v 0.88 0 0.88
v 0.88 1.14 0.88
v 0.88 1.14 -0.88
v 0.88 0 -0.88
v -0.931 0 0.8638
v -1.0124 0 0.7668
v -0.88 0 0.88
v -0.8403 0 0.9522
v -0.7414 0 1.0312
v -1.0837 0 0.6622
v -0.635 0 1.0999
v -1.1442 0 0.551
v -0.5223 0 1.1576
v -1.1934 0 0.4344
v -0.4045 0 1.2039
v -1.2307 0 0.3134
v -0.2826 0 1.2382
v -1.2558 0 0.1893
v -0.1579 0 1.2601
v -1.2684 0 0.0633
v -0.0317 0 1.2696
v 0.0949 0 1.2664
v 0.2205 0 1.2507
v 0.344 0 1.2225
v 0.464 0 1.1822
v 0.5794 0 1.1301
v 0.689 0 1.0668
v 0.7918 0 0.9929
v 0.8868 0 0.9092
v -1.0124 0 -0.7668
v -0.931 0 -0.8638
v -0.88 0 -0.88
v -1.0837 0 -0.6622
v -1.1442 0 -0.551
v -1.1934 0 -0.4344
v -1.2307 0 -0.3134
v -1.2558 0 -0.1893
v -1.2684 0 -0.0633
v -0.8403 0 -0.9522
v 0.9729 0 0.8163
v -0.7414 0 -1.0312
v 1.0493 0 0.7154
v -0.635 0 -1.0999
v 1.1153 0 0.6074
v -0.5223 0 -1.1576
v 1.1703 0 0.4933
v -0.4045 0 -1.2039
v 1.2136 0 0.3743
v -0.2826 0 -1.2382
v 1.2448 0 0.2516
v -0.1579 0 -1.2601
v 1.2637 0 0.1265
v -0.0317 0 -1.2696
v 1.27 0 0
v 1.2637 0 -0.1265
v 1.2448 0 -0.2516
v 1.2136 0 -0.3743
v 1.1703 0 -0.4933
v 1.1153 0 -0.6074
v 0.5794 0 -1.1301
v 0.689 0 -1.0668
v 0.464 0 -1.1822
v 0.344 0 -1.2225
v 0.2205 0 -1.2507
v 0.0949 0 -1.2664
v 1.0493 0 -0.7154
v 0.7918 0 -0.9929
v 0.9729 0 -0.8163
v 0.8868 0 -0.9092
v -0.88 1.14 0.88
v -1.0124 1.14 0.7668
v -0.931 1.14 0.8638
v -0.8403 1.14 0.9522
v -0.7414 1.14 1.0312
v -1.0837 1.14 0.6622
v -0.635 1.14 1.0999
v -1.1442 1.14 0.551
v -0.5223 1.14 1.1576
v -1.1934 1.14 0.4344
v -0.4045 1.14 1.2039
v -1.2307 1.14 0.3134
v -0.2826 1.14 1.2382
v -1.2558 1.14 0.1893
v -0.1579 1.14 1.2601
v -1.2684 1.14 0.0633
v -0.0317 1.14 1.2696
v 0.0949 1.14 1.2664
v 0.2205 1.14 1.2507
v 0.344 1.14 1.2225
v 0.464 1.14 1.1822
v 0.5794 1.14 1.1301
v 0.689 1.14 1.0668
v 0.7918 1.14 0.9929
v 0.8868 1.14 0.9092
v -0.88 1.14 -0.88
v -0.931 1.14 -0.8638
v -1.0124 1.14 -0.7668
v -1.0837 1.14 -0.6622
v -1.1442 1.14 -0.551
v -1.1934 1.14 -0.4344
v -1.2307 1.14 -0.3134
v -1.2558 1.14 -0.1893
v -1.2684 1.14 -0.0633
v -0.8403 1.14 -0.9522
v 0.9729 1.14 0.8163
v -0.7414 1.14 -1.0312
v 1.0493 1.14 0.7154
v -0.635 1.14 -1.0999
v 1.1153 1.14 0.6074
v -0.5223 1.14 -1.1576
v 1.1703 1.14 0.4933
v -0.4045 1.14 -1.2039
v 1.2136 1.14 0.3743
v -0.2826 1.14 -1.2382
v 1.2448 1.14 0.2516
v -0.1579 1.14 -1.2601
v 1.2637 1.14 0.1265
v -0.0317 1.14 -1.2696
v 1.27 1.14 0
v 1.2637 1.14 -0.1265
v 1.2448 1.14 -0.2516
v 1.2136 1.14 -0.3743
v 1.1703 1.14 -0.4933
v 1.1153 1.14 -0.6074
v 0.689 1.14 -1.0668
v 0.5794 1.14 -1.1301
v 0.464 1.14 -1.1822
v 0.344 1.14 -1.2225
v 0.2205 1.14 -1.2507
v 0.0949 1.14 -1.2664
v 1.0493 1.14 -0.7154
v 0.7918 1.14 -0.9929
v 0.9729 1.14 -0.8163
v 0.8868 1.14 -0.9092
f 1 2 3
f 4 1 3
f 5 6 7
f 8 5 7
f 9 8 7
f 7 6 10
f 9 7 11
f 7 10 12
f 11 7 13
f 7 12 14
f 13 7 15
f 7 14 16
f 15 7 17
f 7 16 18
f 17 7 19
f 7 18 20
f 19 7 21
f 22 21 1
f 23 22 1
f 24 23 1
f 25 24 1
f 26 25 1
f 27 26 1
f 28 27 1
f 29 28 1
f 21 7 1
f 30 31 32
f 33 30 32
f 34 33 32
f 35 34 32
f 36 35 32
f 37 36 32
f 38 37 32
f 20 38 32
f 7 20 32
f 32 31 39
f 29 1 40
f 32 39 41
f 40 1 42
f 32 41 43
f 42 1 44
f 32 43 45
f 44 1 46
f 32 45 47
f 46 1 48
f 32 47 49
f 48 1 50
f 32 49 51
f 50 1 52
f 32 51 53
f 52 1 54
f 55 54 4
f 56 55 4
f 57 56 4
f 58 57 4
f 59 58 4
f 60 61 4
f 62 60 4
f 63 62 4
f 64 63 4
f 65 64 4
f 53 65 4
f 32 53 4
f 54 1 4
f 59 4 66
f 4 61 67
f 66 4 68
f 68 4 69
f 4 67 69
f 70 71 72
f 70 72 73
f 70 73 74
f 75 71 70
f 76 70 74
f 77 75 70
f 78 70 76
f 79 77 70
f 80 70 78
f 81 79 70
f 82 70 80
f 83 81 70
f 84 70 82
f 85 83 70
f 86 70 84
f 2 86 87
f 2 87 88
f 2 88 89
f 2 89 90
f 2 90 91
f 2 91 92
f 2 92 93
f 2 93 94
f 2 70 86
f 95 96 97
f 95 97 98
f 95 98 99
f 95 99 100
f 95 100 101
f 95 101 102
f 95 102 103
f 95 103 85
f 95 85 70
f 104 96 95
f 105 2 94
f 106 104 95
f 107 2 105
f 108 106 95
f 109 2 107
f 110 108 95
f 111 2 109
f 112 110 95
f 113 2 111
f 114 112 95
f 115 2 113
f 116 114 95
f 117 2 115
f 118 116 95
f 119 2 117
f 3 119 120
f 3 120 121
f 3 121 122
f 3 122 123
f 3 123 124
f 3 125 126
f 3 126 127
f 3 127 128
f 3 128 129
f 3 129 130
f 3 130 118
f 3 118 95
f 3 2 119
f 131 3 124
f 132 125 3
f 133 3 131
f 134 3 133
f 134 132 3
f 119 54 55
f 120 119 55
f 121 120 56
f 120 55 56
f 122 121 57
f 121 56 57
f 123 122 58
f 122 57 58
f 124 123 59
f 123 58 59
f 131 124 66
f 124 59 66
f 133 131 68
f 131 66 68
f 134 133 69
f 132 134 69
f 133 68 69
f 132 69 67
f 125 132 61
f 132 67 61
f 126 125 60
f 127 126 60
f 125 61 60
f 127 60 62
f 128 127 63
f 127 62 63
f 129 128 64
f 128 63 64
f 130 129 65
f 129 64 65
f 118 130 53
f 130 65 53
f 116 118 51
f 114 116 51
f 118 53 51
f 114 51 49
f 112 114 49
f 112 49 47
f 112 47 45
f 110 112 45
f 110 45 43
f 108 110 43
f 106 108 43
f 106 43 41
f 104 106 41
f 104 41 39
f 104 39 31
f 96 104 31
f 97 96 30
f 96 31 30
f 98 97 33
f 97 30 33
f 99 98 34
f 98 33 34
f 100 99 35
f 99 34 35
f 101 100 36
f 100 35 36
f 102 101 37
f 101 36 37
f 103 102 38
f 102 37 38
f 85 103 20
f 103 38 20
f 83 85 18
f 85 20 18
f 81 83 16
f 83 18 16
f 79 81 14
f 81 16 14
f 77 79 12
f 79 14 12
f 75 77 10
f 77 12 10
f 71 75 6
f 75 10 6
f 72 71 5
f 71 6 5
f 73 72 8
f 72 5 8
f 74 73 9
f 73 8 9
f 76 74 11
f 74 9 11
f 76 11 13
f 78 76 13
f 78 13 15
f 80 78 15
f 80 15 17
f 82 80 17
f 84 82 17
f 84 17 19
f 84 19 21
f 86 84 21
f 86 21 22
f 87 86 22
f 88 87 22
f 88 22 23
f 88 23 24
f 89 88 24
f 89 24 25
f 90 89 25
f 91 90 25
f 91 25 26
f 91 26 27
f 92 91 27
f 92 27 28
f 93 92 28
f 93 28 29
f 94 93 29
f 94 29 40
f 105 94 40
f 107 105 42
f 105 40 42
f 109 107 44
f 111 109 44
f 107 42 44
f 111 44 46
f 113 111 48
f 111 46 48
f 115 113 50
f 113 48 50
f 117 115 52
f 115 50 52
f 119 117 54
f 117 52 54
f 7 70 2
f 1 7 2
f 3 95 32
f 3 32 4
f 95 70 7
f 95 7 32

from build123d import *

# Parameters (mm, degrees)
SKETCH1_R           = 1.27
BOSS_EXTRUDE1_DEPTH = 1.14
SKETCH2_W           = 1.76
SKETCH2_H           = 1.76
CUT_EXTRUDE2_DEPTH  = 1.14


with BuildPart() as part:
    # Sketch1 → Boss-Extrude1 (new body)
    with BuildSketch(Plane(origin=(0, 0, 0), x_dir=(1, 0, 0), z_dir=(0, 1, 0))):
        Circle(SKETCH1_R)
    extrude(amount=BOSS_EXTRUDE1_DEPTH)

    # Sketch2 → Cut-Extrude2 (cut)
    with BuildSketch(Plane(origin=(0, 1.14, 0), x_dir=(1, 0, 0), z_dir=(0, 1, 0))):
        Rectangle(SKETCH2_W, SKETCH2_H)
    extrude(amount=-CUT_EXTRUDE2_DEPTH, mode=Mode.SUBTRACT)


solid = part.part
